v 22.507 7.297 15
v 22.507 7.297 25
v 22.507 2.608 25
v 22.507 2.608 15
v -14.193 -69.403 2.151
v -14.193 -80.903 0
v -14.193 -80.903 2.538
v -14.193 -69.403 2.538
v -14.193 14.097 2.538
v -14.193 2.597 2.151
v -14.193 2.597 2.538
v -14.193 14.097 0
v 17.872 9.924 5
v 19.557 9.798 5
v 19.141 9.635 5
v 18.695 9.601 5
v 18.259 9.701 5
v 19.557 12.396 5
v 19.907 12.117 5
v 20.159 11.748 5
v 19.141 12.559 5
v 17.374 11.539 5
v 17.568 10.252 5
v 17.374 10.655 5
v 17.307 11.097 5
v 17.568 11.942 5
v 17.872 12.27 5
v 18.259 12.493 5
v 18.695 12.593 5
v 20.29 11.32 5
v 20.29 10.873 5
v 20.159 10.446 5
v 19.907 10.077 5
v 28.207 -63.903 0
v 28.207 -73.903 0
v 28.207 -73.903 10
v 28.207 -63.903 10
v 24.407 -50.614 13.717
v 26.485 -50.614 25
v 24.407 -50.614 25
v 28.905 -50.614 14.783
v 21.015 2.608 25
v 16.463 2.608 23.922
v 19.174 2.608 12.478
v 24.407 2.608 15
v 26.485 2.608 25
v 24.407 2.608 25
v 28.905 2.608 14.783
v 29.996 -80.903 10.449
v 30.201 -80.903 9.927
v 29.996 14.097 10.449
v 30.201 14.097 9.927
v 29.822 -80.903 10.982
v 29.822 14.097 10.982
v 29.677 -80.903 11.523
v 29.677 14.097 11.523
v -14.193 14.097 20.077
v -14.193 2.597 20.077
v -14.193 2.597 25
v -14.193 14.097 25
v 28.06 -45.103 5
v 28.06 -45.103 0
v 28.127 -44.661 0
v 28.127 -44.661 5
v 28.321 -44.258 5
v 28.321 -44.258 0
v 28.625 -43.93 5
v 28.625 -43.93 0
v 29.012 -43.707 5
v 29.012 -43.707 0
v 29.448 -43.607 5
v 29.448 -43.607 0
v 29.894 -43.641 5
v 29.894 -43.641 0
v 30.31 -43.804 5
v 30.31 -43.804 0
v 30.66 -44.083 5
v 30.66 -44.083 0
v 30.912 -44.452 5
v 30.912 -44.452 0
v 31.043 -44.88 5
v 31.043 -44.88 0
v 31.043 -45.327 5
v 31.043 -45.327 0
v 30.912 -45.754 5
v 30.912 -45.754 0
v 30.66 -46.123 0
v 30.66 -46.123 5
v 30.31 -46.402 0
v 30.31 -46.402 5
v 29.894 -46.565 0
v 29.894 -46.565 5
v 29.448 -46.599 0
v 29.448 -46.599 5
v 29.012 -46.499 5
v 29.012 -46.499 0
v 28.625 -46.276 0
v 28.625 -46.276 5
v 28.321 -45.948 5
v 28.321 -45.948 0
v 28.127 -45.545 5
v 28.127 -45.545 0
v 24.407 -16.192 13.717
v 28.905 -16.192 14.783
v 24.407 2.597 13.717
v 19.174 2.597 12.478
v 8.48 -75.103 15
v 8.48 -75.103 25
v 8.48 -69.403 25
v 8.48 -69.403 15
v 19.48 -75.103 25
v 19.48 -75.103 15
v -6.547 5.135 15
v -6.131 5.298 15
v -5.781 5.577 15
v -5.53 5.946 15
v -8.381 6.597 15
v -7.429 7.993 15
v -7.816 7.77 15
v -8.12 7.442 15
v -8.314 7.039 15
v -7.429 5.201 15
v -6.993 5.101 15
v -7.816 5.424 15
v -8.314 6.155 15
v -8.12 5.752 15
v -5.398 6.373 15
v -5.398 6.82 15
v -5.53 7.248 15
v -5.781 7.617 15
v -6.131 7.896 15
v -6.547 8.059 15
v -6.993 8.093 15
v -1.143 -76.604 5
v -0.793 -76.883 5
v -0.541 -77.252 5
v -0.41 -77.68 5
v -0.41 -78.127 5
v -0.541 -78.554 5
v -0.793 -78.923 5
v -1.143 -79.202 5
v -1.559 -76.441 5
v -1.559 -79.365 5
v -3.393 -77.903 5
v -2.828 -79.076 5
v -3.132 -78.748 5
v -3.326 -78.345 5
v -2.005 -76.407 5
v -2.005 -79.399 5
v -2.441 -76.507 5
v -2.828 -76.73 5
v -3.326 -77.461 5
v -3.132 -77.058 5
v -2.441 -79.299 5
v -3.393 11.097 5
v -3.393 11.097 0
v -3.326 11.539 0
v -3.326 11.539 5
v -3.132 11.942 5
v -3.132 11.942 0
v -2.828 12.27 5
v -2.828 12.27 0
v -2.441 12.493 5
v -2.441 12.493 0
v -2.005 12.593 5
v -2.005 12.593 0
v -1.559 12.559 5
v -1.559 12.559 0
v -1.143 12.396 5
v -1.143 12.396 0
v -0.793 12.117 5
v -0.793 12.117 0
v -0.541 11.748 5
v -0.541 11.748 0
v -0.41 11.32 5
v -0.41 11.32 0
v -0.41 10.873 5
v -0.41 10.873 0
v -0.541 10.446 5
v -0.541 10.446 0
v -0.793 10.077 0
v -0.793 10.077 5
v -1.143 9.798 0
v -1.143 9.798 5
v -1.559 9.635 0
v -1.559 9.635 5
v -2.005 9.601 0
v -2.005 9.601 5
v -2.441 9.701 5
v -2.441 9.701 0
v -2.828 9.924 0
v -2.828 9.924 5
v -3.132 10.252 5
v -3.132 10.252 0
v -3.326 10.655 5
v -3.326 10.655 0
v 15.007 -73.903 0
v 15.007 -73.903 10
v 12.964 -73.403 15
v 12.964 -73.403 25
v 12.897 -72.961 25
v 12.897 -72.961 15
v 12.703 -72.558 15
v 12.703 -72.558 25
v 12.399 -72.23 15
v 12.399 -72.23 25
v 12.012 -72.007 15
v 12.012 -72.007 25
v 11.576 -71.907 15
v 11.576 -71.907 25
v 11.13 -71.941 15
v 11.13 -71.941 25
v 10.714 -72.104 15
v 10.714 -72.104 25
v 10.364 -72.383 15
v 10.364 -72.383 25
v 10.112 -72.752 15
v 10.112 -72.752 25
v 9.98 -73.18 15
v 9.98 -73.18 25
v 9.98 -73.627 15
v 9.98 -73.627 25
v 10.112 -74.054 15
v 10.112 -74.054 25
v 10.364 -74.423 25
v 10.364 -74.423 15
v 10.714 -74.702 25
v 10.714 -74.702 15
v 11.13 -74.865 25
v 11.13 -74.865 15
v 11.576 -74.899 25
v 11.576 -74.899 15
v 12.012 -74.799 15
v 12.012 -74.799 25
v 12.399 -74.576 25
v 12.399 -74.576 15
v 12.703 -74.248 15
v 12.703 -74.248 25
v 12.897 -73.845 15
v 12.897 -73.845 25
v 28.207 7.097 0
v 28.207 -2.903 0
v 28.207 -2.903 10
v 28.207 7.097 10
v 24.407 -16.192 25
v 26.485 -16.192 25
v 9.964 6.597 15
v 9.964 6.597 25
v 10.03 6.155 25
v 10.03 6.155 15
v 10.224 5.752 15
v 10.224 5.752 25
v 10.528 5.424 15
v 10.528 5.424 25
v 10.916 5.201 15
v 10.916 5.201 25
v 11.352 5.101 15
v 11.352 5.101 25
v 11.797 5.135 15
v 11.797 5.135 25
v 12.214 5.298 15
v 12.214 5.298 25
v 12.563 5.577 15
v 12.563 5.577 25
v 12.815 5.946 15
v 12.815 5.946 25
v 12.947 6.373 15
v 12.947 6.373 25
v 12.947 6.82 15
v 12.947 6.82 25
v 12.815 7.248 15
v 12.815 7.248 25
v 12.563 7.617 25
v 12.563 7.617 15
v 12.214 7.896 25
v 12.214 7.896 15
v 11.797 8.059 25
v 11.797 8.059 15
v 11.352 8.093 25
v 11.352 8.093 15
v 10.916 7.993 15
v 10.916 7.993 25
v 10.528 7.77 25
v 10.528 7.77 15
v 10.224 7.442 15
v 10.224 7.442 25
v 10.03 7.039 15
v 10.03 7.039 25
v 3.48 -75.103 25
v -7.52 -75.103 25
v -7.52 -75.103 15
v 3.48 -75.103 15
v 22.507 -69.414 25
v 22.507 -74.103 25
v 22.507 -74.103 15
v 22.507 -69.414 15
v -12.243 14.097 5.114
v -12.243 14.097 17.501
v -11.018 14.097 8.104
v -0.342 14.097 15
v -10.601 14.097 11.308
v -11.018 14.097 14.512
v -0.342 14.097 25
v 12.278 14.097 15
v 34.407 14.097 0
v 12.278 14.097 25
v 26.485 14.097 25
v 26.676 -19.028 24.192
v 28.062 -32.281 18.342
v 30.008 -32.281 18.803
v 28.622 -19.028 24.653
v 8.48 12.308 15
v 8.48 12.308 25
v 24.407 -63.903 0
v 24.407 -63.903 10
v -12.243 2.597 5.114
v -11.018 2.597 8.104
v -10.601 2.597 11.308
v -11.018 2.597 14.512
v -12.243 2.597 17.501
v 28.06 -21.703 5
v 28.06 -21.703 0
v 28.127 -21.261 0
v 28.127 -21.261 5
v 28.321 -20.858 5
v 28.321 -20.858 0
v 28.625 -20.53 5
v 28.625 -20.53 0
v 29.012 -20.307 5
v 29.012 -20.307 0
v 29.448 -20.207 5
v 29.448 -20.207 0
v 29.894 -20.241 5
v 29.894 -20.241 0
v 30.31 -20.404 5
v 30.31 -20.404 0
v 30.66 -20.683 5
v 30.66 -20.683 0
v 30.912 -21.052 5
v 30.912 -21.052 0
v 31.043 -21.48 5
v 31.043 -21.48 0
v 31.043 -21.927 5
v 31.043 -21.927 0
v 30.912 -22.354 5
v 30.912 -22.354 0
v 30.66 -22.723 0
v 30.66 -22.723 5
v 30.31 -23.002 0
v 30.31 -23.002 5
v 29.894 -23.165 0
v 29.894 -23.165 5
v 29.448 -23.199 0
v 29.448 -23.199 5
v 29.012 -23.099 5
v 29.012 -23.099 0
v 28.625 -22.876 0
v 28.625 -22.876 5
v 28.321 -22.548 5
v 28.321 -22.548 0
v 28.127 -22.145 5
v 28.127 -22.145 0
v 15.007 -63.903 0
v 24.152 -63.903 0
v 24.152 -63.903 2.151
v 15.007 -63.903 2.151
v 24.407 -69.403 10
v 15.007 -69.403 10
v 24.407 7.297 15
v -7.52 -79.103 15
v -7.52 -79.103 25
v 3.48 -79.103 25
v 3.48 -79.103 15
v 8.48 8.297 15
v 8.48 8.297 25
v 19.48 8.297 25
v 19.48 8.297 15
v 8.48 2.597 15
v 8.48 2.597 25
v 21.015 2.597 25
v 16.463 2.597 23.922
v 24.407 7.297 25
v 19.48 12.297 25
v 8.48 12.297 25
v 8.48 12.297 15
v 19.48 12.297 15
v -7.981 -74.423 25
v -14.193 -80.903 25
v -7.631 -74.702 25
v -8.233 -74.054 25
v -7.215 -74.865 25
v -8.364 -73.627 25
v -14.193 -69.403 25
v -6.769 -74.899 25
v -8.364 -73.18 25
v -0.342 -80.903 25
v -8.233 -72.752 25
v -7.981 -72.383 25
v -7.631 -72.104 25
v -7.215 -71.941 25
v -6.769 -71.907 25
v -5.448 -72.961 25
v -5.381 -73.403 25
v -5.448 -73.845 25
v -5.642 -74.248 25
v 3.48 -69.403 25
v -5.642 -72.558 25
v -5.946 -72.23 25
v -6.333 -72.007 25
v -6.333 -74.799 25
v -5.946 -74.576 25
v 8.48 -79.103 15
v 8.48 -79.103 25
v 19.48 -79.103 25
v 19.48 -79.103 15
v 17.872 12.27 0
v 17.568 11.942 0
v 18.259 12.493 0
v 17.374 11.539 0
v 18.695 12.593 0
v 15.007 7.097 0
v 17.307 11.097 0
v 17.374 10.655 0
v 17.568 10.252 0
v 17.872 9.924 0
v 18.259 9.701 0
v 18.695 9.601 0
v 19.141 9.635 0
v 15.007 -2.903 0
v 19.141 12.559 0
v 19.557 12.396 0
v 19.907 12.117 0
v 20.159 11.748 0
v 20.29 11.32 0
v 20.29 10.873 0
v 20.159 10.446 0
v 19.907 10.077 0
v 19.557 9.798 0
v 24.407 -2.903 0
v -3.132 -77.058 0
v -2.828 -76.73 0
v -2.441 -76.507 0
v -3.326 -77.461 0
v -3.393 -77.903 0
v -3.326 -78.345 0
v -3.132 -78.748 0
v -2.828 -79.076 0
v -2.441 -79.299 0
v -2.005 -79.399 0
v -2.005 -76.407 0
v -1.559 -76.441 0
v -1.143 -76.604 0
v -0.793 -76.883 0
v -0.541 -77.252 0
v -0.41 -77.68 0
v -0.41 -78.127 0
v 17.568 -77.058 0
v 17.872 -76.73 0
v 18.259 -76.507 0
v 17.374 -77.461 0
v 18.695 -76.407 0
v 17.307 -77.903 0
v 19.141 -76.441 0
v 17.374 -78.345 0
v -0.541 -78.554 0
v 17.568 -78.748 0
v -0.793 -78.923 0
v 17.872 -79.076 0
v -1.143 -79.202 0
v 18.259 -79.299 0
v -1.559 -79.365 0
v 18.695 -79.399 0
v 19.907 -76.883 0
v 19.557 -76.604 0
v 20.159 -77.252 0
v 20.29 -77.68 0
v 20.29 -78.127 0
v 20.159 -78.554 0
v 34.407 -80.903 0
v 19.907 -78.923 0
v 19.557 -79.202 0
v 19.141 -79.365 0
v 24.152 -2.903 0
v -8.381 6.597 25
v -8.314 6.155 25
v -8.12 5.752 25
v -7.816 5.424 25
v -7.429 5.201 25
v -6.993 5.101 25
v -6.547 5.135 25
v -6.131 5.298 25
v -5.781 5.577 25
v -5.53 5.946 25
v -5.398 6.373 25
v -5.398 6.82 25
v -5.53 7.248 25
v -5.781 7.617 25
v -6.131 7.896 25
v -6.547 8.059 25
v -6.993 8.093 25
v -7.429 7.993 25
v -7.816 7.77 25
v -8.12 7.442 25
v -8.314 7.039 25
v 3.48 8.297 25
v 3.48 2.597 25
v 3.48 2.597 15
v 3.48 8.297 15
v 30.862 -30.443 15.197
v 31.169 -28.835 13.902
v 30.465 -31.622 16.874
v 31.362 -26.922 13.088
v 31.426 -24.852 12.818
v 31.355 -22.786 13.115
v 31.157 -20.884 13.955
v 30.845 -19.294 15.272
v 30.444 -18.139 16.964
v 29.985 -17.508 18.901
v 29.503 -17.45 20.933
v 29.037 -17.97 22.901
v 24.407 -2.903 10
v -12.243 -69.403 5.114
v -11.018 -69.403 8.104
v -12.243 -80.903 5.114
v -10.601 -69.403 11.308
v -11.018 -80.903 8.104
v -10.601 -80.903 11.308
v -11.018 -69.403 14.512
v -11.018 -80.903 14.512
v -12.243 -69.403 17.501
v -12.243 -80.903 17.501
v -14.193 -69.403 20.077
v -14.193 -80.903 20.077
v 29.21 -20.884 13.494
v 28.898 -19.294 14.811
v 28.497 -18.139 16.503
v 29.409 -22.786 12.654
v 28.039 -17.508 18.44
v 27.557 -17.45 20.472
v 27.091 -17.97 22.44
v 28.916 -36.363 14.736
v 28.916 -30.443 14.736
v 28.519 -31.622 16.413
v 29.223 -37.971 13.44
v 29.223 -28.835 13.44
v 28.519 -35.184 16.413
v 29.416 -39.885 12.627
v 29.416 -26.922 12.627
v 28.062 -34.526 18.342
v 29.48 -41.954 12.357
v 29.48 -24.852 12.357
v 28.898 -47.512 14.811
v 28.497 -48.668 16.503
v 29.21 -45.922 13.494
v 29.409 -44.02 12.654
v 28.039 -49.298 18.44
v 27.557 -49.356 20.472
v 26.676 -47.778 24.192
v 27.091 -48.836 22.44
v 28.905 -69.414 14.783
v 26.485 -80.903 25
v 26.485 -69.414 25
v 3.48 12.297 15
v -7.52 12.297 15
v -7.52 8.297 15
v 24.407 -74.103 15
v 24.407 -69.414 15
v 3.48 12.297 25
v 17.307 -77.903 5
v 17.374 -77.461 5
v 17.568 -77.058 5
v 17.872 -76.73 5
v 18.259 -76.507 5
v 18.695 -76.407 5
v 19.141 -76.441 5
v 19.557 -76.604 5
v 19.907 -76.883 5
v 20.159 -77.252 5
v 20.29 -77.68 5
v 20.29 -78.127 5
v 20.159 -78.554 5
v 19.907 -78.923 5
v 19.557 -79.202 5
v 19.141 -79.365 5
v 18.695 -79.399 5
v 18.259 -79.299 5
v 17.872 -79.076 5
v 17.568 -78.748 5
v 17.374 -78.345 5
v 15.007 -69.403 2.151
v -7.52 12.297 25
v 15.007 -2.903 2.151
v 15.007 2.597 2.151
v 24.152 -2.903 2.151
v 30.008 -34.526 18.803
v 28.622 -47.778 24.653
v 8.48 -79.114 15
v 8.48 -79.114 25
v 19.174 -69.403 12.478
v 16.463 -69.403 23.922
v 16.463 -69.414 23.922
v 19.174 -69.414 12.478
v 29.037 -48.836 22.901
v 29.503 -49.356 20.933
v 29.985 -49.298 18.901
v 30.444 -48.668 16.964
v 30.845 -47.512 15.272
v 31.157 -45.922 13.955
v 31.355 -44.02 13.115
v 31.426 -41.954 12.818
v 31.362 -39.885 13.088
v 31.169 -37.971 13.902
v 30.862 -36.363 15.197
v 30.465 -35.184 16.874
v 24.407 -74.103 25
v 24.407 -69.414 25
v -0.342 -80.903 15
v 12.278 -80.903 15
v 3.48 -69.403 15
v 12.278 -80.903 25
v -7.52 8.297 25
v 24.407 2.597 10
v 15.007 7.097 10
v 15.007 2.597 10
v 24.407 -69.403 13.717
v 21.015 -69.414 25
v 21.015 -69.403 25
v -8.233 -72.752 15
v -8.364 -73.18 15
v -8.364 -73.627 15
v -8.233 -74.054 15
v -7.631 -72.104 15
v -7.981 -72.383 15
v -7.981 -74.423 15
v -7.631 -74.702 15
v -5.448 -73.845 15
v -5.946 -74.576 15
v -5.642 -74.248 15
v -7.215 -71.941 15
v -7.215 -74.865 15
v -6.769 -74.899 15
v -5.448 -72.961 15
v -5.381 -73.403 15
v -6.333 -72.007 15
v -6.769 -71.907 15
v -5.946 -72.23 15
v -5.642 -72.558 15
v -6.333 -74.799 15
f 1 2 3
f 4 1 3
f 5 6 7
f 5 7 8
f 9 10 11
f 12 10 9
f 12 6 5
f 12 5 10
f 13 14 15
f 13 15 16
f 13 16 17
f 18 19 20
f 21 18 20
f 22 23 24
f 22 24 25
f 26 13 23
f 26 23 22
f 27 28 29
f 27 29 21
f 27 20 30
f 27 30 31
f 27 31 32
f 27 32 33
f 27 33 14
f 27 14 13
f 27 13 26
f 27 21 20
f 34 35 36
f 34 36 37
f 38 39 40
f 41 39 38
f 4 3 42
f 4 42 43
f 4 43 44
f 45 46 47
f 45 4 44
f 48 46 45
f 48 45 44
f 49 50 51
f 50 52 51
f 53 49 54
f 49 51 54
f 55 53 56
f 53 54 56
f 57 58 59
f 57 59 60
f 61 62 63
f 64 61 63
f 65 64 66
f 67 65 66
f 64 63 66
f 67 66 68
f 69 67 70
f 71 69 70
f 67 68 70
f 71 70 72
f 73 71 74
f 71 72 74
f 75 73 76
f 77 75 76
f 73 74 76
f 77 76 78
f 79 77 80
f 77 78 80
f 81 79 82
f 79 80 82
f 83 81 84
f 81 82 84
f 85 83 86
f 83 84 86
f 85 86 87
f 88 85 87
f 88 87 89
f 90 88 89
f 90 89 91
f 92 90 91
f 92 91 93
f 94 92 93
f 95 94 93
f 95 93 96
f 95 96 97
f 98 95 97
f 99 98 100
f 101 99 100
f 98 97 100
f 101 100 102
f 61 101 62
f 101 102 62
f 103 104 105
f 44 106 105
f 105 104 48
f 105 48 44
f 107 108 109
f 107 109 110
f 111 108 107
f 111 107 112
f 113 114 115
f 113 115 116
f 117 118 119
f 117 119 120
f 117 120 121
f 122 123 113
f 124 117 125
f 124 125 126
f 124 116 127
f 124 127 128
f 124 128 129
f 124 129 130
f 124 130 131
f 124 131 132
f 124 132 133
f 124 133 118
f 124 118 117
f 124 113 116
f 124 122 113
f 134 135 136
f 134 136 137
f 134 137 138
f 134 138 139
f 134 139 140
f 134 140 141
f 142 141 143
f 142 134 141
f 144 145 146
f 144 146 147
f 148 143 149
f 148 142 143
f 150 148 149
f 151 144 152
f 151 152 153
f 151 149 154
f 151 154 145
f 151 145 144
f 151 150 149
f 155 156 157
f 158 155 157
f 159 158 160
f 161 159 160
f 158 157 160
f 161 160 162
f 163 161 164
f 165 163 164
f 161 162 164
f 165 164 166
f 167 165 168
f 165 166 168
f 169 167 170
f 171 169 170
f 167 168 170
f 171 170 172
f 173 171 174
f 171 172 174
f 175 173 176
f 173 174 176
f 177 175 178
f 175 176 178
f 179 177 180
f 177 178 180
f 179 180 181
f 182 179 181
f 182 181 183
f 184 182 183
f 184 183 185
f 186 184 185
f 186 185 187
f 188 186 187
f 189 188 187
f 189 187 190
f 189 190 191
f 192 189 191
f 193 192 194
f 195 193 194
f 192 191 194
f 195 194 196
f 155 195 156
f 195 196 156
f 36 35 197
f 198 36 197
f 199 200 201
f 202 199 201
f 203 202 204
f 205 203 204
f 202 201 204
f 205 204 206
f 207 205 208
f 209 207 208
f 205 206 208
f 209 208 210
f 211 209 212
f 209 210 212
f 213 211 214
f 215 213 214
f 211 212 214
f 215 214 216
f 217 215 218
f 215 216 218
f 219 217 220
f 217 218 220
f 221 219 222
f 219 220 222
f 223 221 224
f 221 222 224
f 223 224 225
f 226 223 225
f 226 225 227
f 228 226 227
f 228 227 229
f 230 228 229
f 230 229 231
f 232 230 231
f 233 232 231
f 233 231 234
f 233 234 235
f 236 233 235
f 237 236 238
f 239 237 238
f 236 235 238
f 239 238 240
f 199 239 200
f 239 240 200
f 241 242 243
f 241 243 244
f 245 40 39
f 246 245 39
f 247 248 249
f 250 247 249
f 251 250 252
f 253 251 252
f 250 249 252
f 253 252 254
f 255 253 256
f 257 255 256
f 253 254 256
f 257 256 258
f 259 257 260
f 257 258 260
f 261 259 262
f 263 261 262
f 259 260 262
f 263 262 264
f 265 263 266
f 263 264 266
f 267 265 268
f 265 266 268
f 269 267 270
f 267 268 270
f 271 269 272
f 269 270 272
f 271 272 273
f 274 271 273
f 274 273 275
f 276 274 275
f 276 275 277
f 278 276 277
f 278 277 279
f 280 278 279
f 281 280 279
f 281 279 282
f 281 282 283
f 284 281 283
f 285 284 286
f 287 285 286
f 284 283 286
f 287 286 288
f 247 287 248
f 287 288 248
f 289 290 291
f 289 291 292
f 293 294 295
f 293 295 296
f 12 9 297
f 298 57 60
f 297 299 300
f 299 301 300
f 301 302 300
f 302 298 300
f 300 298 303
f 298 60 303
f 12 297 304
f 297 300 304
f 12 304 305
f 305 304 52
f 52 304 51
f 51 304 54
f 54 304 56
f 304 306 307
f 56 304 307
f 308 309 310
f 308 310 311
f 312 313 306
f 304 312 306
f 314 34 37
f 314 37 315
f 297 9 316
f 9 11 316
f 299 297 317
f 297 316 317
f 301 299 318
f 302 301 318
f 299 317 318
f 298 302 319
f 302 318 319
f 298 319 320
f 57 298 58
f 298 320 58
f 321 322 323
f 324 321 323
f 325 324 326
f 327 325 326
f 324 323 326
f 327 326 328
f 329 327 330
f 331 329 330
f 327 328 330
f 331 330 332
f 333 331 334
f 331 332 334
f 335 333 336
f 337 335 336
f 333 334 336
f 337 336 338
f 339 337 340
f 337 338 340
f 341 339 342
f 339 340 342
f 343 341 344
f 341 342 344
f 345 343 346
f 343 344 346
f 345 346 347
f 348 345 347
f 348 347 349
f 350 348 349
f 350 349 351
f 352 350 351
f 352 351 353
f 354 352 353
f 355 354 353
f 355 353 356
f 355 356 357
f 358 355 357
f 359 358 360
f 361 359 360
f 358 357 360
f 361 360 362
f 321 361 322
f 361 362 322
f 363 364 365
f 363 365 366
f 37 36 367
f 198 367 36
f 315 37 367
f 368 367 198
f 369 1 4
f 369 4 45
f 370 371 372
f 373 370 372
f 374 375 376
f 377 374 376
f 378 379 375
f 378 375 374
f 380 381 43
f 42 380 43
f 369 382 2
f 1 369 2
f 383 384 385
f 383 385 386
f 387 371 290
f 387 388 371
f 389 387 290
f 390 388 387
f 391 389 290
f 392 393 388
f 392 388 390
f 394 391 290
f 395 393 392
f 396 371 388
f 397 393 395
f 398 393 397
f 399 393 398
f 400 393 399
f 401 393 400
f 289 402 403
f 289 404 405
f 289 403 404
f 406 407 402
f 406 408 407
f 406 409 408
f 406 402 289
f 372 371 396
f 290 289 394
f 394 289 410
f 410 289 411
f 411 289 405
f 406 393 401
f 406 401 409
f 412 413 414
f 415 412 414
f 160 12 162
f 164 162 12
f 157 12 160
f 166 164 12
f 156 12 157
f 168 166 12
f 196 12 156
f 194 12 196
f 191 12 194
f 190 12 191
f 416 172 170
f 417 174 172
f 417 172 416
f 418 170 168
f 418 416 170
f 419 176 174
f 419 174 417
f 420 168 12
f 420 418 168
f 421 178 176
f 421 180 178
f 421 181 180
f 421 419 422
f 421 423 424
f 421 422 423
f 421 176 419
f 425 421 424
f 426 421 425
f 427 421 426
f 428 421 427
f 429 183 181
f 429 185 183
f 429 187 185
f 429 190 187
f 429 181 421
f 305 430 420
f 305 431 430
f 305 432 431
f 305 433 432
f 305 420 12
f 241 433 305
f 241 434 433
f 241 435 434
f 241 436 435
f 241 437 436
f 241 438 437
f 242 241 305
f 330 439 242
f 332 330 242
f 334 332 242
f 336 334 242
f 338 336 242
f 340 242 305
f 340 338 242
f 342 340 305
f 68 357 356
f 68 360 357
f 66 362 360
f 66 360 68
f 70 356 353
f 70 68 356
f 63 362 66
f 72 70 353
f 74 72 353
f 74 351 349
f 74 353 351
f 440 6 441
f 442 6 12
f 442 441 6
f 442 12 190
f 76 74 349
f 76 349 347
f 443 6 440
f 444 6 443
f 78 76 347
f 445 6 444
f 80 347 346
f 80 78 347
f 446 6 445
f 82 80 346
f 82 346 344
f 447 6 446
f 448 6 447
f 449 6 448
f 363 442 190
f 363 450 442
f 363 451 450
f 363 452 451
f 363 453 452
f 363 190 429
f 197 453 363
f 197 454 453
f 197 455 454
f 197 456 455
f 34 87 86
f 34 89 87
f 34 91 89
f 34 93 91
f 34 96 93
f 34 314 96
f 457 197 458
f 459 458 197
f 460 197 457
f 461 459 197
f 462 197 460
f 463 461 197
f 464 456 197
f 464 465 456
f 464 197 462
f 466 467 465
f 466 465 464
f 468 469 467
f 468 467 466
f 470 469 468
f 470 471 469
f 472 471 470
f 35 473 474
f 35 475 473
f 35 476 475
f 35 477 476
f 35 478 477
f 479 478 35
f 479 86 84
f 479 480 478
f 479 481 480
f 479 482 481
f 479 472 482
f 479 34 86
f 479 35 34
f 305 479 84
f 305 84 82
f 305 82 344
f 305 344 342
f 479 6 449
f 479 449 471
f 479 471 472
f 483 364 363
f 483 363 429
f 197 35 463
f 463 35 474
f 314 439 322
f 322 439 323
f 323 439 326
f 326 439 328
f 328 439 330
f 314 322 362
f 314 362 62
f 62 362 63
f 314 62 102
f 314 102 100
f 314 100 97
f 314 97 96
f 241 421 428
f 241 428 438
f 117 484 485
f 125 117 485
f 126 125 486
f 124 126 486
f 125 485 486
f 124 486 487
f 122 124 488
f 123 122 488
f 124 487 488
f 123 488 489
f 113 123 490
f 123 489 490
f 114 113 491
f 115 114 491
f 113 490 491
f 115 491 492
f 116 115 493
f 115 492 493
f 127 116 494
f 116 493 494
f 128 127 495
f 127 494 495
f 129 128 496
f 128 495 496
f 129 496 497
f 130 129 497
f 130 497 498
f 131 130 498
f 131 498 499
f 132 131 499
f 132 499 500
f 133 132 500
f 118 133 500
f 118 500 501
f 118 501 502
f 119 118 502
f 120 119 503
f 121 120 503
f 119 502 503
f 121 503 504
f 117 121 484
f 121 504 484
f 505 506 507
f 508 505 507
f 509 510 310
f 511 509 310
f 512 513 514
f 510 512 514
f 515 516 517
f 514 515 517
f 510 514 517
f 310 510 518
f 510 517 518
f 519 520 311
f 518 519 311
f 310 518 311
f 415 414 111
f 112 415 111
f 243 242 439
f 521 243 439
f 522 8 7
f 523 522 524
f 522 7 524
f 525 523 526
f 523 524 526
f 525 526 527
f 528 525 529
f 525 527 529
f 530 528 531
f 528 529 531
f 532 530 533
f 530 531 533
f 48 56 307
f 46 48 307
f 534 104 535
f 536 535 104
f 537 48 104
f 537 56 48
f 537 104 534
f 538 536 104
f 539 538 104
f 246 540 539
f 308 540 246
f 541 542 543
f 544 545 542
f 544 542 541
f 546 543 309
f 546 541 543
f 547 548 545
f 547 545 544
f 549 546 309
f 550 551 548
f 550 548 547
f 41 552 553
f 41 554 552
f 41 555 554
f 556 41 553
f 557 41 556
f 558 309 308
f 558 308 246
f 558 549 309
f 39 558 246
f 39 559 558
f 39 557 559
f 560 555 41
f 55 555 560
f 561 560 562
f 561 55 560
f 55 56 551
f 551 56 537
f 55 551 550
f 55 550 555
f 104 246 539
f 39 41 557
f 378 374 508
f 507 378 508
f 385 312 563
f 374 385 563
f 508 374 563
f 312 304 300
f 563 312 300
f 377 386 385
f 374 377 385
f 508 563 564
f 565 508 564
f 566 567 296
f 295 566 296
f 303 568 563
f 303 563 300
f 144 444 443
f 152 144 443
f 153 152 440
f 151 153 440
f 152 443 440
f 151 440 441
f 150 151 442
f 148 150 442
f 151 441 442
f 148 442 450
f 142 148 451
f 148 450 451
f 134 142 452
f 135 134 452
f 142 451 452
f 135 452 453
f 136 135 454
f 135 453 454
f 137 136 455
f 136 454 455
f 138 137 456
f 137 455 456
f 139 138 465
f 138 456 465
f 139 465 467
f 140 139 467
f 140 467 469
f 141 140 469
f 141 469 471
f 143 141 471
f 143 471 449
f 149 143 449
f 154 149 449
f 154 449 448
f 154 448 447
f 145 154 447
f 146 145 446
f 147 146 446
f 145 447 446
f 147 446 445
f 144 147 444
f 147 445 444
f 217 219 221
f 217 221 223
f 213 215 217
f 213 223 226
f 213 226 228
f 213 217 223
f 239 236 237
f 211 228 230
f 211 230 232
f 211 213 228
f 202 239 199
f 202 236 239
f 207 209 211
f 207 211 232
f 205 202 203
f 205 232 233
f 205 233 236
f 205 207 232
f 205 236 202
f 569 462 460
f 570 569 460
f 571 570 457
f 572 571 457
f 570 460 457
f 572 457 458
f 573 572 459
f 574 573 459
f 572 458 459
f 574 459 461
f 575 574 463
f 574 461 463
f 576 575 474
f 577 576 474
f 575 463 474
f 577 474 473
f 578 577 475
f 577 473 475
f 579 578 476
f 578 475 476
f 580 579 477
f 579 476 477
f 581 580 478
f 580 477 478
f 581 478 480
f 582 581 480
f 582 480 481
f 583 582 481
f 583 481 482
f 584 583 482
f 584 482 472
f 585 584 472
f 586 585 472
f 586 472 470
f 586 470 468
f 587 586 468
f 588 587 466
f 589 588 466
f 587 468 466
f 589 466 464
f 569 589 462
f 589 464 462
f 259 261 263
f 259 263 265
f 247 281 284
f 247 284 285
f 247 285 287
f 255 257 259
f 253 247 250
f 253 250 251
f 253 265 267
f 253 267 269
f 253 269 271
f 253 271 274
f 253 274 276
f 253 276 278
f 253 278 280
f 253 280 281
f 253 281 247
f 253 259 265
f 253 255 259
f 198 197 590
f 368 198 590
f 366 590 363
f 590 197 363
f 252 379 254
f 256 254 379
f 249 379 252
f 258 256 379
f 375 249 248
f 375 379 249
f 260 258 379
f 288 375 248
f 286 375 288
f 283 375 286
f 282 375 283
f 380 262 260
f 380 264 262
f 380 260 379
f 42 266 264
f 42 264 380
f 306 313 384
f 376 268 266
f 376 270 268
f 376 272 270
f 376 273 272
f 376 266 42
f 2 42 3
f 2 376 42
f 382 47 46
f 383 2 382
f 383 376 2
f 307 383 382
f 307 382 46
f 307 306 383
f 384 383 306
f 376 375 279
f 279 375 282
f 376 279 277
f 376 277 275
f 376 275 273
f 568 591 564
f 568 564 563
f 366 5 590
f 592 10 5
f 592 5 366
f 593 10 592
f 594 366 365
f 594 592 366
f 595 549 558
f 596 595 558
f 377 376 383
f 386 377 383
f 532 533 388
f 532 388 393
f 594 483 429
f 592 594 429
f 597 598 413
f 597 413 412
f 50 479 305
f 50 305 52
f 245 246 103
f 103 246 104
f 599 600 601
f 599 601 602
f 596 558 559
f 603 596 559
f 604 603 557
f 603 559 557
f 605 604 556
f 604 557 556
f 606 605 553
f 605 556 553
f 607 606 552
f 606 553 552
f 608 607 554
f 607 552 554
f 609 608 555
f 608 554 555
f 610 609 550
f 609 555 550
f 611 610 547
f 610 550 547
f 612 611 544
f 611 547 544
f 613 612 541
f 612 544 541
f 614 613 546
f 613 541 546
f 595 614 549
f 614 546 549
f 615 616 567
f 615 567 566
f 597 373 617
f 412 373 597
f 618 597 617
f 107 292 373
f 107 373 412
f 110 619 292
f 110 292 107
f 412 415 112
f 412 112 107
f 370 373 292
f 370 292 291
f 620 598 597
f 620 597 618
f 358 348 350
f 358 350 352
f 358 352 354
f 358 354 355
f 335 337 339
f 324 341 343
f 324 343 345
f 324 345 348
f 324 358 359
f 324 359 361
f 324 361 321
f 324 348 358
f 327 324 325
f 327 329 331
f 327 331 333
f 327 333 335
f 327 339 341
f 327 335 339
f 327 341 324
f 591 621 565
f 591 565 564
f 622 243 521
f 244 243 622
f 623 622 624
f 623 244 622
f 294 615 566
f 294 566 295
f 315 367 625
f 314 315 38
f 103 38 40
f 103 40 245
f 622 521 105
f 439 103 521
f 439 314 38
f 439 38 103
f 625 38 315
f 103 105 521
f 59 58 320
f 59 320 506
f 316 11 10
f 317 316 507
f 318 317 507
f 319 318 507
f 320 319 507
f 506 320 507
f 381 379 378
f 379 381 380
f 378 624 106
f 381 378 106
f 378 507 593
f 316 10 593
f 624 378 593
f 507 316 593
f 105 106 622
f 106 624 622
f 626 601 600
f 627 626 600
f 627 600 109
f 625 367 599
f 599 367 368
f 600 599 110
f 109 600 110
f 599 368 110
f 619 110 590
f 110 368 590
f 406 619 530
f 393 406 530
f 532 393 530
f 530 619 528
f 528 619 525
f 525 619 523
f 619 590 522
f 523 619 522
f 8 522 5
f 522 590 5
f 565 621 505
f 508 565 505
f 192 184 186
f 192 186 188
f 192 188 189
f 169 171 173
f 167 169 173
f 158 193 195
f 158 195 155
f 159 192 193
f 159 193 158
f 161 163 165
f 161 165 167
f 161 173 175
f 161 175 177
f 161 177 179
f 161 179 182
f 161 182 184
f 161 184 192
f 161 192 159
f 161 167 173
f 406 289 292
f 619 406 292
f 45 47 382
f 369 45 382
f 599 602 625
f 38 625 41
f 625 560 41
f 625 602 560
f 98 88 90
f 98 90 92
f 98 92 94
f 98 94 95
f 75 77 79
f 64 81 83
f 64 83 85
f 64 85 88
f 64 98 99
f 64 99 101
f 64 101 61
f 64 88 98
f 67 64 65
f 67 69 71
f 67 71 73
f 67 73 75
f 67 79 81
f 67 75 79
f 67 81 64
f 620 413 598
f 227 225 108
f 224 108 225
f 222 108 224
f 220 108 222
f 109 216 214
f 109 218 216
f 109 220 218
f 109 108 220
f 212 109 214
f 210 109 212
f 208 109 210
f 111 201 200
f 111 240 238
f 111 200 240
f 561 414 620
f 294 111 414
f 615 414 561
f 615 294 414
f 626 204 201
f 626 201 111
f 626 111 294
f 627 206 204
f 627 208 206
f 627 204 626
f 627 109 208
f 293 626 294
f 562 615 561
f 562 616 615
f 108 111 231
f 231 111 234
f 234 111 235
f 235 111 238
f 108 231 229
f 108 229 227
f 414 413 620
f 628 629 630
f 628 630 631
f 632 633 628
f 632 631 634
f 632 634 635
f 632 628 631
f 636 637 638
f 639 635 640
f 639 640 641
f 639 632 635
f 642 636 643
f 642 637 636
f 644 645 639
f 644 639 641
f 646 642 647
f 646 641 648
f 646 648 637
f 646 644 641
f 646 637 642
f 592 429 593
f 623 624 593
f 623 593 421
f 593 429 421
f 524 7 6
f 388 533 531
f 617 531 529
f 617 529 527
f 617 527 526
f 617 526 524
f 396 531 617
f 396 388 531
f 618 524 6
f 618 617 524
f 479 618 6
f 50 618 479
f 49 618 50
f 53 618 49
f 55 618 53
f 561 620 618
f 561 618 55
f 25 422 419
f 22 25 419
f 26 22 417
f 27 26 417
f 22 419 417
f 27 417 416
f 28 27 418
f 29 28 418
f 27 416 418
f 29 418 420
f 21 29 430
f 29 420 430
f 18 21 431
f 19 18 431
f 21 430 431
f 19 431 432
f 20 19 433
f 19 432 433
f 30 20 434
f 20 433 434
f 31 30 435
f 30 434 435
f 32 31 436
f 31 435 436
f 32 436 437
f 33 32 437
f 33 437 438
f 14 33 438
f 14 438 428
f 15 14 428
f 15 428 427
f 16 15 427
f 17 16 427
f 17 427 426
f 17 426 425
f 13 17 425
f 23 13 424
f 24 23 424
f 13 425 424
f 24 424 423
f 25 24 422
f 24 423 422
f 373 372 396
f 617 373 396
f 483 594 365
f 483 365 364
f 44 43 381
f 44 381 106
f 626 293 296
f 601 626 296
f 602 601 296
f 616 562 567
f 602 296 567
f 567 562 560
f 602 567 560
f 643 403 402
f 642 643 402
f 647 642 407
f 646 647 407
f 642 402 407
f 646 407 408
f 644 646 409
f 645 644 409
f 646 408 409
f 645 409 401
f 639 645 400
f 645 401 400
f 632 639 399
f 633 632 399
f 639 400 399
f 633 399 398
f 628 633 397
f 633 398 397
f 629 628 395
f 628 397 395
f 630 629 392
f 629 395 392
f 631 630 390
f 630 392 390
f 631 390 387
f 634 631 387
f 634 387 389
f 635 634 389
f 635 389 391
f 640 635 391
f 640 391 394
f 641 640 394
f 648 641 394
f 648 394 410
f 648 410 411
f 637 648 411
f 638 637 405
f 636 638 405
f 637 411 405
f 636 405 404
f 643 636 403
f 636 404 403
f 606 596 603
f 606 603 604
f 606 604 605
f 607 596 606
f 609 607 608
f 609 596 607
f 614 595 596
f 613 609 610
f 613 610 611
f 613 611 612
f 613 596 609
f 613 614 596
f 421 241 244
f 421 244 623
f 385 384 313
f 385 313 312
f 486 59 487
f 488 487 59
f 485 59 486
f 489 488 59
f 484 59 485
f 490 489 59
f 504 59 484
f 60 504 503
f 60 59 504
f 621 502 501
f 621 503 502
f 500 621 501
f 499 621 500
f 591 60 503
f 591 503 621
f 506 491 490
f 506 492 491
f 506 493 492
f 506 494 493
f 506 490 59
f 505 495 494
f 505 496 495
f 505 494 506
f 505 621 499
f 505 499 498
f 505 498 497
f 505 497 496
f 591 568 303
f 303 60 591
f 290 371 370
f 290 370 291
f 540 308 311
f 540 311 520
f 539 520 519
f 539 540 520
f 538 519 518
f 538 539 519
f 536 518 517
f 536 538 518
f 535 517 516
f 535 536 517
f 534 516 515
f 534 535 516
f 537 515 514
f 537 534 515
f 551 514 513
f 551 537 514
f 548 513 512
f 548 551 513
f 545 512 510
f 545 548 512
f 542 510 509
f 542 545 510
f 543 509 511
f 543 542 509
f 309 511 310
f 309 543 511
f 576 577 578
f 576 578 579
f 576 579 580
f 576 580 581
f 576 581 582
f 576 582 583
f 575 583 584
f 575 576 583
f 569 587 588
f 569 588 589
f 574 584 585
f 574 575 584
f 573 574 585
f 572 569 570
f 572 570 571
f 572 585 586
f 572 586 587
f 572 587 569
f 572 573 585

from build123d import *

# Parameters (mm, degrees)
CROQUIS1_W              = 46.6
CROQUIS1_H              = 11.5
CROQUIS1_W_2            = 8
CROQUIS1_H_2            = 72
SALIENTE_EXTRUIR1_DEPTH = 25
CROQUIS3_W              = 30
CROQUIS3_H              = 5
CORTAR_EXTRUIR1_DEPTH   = 100
CROQUIS4_W              = 5
CROQUIS4_H              = 10
CORTAR_EXTRUIR2_DEPTH   = 2000
CORTAR_EXTRUIR3_DEPTH   = 2000
CROQUIS7_W              = 38.34522513
CROQUIS7_H              = 2.150988128
SALIENTE_EXTRUIR2_DEPTH = 90
CROQUIS8_W              = 13.2
CROQUIS8_H              = 10
CORTAR_EXTRUIR4_DEPTH   = 10
SALIENTE_EXTRUIR3_DEPTH = 95
CROQUIS10_R             = 12.5
CORTAR_EXTRUIR5_DEPTH   = 95
SALIENTE_EXTRUIR4_DEPTH = 2
REDONDEO1_R             = 10
CROQUIS13_R             = 1.5
CORTAR_EXTRUIR7_DEPTH   = 5
CROQUIS16_W             = 11.760768102
CROQUIS16_H             = 18.8
CORTAR_EXTRUIR9_DEPTH   = 10
CORTAR_EXTRUIR10_DEPTH  = 10
CROQUIS18_W             = 27
CROQUIS18_H             = 4
CORTAR_EXTRUIR11_DEPTH  = 10
CROQUIS20_R             = 1.5
CORTAR_EXTRUIR12_DEPTH  = 10


with BuildPart() as part:
    # Croquis1 → Saliente-Extruir1 (new body)
    with BuildSketch(Plane.XY):
        with Locations((9.10717527, 8.346927266)):
            Rectangle(CROQUIS1_W, CROQUIS1_H)
        with Locations((28.40717527, -33.403072734)):
            Rectangle(CROQUIS1_W_2, CROQUIS1_H_2)
        Polygon((32.40717527, -80.903072734), (32.40717527, -69.403072734), (24.40717527, -69.403072734), (-14.19282473, -69.403072734), (-14.19282473, -80.903072734), align=None)
    extrude(amount=SALIENTE_EXTRUIR1_DEPTH)

    # Croquis3 → Cortar-Extruir1 (cut)
    with BuildSketch(Plane(origin=(32.40717527, 0, 0), x_dir=(0, 0, -1), z_dir=(1, 0, 0))):
        with Locations((-30, -60.403072734)):
            Rectangle(CROQUIS3_W, CROQUIS3_H)
        with Locations((-30, -6.403072734)):
            Rectangle(CROQUIS3_W, CROQUIS3_H)
    extrude(amount=-CORTAR_EXTRUIR1_DEPTH, mode=Mode.SUBTRACT)

    # Croquis4 → Cortar-Extruir2 (cut)
    with BuildSketch(Plane(origin=(0, -80.903072734, 0), x_dir=(-1, 0, 0), z_dir=(0, -1, 0))):
        with Locations((-5.979621663, -20)):
            Rectangle(CROQUIS4_W, CROQUIS4_H)
    extrude(amount=-CORTAR_EXTRUIR2_DEPTH, mode=Mode.SUBTRACT)

    # Croquis5 → Cortar-Extruir3 (cut)
    with BuildSketch(Plane.XZ.offset(80.903072734)):
        Polygon((32.40717527, 0), (26.484562574, 25), (32.40717527, 25), align=None)
    extrude(amount=-CORTAR_EXTRUIR3_DEPTH, mode=Mode.SUBTRACT)

    # Croquis7 → Saliente-Extruir2 (add)
    with BuildSketch(Plane(origin=(0, 14.096927266, 0), x_dir=(1, 0, 0), z_dir=(0, 1, 0))):
        with Locations((4.979787835, -1.075494064)):
            Rectangle(CROQUIS7_W, CROQUIS7_H)
    extrude(amount=-SALIENTE_EXTRUIR2_DEPTH)

    # Croquis8 → Cortar-Extruir4 (cut)
    with BuildSketch(Plane(origin=(0, 0, 0), x_dir=(-1, 0, 0), z_dir=(0, 0, -1))):
        with Locations((-21.60717527, 2.096927266)):
            Rectangle(CROQUIS8_W, CROQUIS8_H)
        with Locations((-21.60717527, -68.903072734)):
            Rectangle(CROQUIS8_W, CROQUIS8_H)
    extrude(amount=-CORTAR_EXTRUIR4_DEPTH, mode=Mode.SUBTRACT)

    # Croquis9 → Saliente-Extruir3 (add)
    with BuildSketch(Plane.XZ.offset(80.903072734)):
        Polygon((32.40717527, 0), (34.40717527, 0), (29.871577543, 10.70303706), align=None)
    extrude(amount=-SALIENTE_EXTRUIR3_DEPTH)

    # Croquis10 → Cortar-Extruir5 (cut)
    with BuildSketch(Plane.XZ.offset(80.903072734)):
        with Locations((-23.100515524, 11.30775419)):
            Circle(CROQUIS10_R)
    extrude(amount=-CORTAR_EXTRUIR5_DEPTH, mode=Mode.SUBTRACT)

    # Croquis11 → Saliente-Extruir4 (add)
    with BuildSketch(Plane(origin=(30.685017166, 0, 7.26941889), x_dir=(0.2305238801243756, 0, -0.9730666681643158), z_dir=(0.9730666681643156, 0, 0.23052388012437558))):
        with BuildLine():
            Line((-11.378913607, -34.525526143), (-17.390636934, -47.778099529))
            ThreePointArc((-17.390636934, -47.778099529), (-5.898546533, -45.001394179), (-11.378913607, -34.525526143))
        make_face()
        with BuildLine():
            Line((-11.378913607, -32.280619326), (-17.390636934, -19.028045939))
            ThreePointArc((-17.390636934, -19.028045939), (-5.898546533, -21.804751289), (-11.378913607, -32.280619326))
        make_face()
    extrude(amount=SALIENTE_EXTRUIR4_DEPTH)

    # Redondeo1
    redondeo1_edges = [part.edges().sort_by_distance(p)[0] for p in [
        (29.871577543, -33.403072734, 10.70303706),
    ]]
    fillet(redondeo1_edges, radius=REDONDEO1_R)

    # Croquis13 → Cortar-Extruir7 (cut)
    with BuildSketch(Plane(origin=(0, 0, 0), x_dir=(-1, 0, 0), z_dir=(0, 0, -1))):
        with Locations((-18.80717527, -77.903072734)):
            Circle(CROQUIS13_R)
        with Locations((1.89282473, -77.903072734)):
            Circle(CROQUIS13_R)
        with Locations((-29.560114376, -45.103072734)):
            Circle(CROQUIS13_R)
        with Locations((-29.560114376, -21.703072734)):
            Circle(CROQUIS13_R)
        with Locations((-18.80717527, 11.096927266)):
            Circle(CROQUIS13_R)
        with Locations((1.89282473, 11.096927266)):
            Circle(CROQUIS13_R)
    extrude(amount=-CORTAR_EXTRUIR7_DEPTH, mode=Mode.SUBTRACT)

    # Croquis16 → Cortar-Extruir9 (cut)
    with BuildSketch(Plane(origin=(30.685017166, 0, 7.26941889), x_dir=(0.2305238801243756, 0, -0.9730666681643158), z_dir=(0.9730666681643156, 0, 0.23052388012437558))):
        with Locations((-13.601726627, -60.013945982)):
            Rectangle(CROQUIS16_W, CROQUIS16_H)
        with Locations((-13.601726627, -6.792199486)):
            Rectangle(CROQUIS16_W, CROQUIS16_H)
    extrude(amount=-CORTAR_EXTRUIR9_DEPTH, mode=Mode.SUBTRACT)

    # Croquis17 → Cortar-Extruir10 (cut)
    with BuildSketch(Plane.XY.offset(25)):
        Polygon((24.40717527, -69.403072734), (24.40717527, -74.103072734), (22.50717527, -74.103072734), (22.50717527, -69.413945982), align=None)
        Polygon((22.50717527, 2.607800514), (24.40717527, 2.596927266), (24.40717527, 7.296927266), (22.50717527, 7.296927266), align=None)
    extrude(amount=-CORTAR_EXTRUIR10_DEPTH, mode=Mode.SUBTRACT)

    # Croquis18 → Cortar-Extruir11 (cut)
    with BuildSketch(Plane.XY.offset(25)):
        Polygon((3.479621663, -80.903072734), (3.479621663, -79.103072734), (-0.341573642, -80.903072734), align=None)
        Polygon((8.479621663, -80.903072734), (8.457050966, -79.103072734), (12.278246271, -80.903072734), align=None)
        with Locations((5.979621663, 10.296927266)):
            Rectangle(CROQUIS18_W, CROQUIS18_H)
        Polygon((12.278246271, 14.096927266), (8.479621663, 14.096927266), (8.457050966, 12.296927266), align=None)
        with Locations((5.979621663, -77.103072734)):
            Rectangle(CROQUIS18_W, CROQUIS18_H)
        Polygon((3.479621663, 12.296927266), (-0.341573642, 14.096927266), (3.479621663, 14.096927266), align=None)
    extrude(amount=-CORTAR_EXTRUIR11_DEPTH, mode=Mode.SUBTRACT)

    # Croquis20 → Cortar-Extruir12 (cut)
    with BuildSketch(Plane.XY.offset(25)):
        with Locations((11.463707662, -73.403072734)):
            Circle(CROQUIS20_R)
        with Locations((-6.881069151, -73.403072734)):
            Circle(CROQUIS20_R)
        with Locations(Location((11.463707662, 6.596927266, 0), (0, 0, 180))):
            Circle(CROQUIS20_R)
        with Locations(Location((-6.881069151, 6.596927266, 0), (0, 0, 180))):
            Circle(CROQUIS20_R)
    extrude(amount=-CORTAR_EXTRUIR12_DEPTH, mode=Mode.SUBTRACT)


solid = part.part
